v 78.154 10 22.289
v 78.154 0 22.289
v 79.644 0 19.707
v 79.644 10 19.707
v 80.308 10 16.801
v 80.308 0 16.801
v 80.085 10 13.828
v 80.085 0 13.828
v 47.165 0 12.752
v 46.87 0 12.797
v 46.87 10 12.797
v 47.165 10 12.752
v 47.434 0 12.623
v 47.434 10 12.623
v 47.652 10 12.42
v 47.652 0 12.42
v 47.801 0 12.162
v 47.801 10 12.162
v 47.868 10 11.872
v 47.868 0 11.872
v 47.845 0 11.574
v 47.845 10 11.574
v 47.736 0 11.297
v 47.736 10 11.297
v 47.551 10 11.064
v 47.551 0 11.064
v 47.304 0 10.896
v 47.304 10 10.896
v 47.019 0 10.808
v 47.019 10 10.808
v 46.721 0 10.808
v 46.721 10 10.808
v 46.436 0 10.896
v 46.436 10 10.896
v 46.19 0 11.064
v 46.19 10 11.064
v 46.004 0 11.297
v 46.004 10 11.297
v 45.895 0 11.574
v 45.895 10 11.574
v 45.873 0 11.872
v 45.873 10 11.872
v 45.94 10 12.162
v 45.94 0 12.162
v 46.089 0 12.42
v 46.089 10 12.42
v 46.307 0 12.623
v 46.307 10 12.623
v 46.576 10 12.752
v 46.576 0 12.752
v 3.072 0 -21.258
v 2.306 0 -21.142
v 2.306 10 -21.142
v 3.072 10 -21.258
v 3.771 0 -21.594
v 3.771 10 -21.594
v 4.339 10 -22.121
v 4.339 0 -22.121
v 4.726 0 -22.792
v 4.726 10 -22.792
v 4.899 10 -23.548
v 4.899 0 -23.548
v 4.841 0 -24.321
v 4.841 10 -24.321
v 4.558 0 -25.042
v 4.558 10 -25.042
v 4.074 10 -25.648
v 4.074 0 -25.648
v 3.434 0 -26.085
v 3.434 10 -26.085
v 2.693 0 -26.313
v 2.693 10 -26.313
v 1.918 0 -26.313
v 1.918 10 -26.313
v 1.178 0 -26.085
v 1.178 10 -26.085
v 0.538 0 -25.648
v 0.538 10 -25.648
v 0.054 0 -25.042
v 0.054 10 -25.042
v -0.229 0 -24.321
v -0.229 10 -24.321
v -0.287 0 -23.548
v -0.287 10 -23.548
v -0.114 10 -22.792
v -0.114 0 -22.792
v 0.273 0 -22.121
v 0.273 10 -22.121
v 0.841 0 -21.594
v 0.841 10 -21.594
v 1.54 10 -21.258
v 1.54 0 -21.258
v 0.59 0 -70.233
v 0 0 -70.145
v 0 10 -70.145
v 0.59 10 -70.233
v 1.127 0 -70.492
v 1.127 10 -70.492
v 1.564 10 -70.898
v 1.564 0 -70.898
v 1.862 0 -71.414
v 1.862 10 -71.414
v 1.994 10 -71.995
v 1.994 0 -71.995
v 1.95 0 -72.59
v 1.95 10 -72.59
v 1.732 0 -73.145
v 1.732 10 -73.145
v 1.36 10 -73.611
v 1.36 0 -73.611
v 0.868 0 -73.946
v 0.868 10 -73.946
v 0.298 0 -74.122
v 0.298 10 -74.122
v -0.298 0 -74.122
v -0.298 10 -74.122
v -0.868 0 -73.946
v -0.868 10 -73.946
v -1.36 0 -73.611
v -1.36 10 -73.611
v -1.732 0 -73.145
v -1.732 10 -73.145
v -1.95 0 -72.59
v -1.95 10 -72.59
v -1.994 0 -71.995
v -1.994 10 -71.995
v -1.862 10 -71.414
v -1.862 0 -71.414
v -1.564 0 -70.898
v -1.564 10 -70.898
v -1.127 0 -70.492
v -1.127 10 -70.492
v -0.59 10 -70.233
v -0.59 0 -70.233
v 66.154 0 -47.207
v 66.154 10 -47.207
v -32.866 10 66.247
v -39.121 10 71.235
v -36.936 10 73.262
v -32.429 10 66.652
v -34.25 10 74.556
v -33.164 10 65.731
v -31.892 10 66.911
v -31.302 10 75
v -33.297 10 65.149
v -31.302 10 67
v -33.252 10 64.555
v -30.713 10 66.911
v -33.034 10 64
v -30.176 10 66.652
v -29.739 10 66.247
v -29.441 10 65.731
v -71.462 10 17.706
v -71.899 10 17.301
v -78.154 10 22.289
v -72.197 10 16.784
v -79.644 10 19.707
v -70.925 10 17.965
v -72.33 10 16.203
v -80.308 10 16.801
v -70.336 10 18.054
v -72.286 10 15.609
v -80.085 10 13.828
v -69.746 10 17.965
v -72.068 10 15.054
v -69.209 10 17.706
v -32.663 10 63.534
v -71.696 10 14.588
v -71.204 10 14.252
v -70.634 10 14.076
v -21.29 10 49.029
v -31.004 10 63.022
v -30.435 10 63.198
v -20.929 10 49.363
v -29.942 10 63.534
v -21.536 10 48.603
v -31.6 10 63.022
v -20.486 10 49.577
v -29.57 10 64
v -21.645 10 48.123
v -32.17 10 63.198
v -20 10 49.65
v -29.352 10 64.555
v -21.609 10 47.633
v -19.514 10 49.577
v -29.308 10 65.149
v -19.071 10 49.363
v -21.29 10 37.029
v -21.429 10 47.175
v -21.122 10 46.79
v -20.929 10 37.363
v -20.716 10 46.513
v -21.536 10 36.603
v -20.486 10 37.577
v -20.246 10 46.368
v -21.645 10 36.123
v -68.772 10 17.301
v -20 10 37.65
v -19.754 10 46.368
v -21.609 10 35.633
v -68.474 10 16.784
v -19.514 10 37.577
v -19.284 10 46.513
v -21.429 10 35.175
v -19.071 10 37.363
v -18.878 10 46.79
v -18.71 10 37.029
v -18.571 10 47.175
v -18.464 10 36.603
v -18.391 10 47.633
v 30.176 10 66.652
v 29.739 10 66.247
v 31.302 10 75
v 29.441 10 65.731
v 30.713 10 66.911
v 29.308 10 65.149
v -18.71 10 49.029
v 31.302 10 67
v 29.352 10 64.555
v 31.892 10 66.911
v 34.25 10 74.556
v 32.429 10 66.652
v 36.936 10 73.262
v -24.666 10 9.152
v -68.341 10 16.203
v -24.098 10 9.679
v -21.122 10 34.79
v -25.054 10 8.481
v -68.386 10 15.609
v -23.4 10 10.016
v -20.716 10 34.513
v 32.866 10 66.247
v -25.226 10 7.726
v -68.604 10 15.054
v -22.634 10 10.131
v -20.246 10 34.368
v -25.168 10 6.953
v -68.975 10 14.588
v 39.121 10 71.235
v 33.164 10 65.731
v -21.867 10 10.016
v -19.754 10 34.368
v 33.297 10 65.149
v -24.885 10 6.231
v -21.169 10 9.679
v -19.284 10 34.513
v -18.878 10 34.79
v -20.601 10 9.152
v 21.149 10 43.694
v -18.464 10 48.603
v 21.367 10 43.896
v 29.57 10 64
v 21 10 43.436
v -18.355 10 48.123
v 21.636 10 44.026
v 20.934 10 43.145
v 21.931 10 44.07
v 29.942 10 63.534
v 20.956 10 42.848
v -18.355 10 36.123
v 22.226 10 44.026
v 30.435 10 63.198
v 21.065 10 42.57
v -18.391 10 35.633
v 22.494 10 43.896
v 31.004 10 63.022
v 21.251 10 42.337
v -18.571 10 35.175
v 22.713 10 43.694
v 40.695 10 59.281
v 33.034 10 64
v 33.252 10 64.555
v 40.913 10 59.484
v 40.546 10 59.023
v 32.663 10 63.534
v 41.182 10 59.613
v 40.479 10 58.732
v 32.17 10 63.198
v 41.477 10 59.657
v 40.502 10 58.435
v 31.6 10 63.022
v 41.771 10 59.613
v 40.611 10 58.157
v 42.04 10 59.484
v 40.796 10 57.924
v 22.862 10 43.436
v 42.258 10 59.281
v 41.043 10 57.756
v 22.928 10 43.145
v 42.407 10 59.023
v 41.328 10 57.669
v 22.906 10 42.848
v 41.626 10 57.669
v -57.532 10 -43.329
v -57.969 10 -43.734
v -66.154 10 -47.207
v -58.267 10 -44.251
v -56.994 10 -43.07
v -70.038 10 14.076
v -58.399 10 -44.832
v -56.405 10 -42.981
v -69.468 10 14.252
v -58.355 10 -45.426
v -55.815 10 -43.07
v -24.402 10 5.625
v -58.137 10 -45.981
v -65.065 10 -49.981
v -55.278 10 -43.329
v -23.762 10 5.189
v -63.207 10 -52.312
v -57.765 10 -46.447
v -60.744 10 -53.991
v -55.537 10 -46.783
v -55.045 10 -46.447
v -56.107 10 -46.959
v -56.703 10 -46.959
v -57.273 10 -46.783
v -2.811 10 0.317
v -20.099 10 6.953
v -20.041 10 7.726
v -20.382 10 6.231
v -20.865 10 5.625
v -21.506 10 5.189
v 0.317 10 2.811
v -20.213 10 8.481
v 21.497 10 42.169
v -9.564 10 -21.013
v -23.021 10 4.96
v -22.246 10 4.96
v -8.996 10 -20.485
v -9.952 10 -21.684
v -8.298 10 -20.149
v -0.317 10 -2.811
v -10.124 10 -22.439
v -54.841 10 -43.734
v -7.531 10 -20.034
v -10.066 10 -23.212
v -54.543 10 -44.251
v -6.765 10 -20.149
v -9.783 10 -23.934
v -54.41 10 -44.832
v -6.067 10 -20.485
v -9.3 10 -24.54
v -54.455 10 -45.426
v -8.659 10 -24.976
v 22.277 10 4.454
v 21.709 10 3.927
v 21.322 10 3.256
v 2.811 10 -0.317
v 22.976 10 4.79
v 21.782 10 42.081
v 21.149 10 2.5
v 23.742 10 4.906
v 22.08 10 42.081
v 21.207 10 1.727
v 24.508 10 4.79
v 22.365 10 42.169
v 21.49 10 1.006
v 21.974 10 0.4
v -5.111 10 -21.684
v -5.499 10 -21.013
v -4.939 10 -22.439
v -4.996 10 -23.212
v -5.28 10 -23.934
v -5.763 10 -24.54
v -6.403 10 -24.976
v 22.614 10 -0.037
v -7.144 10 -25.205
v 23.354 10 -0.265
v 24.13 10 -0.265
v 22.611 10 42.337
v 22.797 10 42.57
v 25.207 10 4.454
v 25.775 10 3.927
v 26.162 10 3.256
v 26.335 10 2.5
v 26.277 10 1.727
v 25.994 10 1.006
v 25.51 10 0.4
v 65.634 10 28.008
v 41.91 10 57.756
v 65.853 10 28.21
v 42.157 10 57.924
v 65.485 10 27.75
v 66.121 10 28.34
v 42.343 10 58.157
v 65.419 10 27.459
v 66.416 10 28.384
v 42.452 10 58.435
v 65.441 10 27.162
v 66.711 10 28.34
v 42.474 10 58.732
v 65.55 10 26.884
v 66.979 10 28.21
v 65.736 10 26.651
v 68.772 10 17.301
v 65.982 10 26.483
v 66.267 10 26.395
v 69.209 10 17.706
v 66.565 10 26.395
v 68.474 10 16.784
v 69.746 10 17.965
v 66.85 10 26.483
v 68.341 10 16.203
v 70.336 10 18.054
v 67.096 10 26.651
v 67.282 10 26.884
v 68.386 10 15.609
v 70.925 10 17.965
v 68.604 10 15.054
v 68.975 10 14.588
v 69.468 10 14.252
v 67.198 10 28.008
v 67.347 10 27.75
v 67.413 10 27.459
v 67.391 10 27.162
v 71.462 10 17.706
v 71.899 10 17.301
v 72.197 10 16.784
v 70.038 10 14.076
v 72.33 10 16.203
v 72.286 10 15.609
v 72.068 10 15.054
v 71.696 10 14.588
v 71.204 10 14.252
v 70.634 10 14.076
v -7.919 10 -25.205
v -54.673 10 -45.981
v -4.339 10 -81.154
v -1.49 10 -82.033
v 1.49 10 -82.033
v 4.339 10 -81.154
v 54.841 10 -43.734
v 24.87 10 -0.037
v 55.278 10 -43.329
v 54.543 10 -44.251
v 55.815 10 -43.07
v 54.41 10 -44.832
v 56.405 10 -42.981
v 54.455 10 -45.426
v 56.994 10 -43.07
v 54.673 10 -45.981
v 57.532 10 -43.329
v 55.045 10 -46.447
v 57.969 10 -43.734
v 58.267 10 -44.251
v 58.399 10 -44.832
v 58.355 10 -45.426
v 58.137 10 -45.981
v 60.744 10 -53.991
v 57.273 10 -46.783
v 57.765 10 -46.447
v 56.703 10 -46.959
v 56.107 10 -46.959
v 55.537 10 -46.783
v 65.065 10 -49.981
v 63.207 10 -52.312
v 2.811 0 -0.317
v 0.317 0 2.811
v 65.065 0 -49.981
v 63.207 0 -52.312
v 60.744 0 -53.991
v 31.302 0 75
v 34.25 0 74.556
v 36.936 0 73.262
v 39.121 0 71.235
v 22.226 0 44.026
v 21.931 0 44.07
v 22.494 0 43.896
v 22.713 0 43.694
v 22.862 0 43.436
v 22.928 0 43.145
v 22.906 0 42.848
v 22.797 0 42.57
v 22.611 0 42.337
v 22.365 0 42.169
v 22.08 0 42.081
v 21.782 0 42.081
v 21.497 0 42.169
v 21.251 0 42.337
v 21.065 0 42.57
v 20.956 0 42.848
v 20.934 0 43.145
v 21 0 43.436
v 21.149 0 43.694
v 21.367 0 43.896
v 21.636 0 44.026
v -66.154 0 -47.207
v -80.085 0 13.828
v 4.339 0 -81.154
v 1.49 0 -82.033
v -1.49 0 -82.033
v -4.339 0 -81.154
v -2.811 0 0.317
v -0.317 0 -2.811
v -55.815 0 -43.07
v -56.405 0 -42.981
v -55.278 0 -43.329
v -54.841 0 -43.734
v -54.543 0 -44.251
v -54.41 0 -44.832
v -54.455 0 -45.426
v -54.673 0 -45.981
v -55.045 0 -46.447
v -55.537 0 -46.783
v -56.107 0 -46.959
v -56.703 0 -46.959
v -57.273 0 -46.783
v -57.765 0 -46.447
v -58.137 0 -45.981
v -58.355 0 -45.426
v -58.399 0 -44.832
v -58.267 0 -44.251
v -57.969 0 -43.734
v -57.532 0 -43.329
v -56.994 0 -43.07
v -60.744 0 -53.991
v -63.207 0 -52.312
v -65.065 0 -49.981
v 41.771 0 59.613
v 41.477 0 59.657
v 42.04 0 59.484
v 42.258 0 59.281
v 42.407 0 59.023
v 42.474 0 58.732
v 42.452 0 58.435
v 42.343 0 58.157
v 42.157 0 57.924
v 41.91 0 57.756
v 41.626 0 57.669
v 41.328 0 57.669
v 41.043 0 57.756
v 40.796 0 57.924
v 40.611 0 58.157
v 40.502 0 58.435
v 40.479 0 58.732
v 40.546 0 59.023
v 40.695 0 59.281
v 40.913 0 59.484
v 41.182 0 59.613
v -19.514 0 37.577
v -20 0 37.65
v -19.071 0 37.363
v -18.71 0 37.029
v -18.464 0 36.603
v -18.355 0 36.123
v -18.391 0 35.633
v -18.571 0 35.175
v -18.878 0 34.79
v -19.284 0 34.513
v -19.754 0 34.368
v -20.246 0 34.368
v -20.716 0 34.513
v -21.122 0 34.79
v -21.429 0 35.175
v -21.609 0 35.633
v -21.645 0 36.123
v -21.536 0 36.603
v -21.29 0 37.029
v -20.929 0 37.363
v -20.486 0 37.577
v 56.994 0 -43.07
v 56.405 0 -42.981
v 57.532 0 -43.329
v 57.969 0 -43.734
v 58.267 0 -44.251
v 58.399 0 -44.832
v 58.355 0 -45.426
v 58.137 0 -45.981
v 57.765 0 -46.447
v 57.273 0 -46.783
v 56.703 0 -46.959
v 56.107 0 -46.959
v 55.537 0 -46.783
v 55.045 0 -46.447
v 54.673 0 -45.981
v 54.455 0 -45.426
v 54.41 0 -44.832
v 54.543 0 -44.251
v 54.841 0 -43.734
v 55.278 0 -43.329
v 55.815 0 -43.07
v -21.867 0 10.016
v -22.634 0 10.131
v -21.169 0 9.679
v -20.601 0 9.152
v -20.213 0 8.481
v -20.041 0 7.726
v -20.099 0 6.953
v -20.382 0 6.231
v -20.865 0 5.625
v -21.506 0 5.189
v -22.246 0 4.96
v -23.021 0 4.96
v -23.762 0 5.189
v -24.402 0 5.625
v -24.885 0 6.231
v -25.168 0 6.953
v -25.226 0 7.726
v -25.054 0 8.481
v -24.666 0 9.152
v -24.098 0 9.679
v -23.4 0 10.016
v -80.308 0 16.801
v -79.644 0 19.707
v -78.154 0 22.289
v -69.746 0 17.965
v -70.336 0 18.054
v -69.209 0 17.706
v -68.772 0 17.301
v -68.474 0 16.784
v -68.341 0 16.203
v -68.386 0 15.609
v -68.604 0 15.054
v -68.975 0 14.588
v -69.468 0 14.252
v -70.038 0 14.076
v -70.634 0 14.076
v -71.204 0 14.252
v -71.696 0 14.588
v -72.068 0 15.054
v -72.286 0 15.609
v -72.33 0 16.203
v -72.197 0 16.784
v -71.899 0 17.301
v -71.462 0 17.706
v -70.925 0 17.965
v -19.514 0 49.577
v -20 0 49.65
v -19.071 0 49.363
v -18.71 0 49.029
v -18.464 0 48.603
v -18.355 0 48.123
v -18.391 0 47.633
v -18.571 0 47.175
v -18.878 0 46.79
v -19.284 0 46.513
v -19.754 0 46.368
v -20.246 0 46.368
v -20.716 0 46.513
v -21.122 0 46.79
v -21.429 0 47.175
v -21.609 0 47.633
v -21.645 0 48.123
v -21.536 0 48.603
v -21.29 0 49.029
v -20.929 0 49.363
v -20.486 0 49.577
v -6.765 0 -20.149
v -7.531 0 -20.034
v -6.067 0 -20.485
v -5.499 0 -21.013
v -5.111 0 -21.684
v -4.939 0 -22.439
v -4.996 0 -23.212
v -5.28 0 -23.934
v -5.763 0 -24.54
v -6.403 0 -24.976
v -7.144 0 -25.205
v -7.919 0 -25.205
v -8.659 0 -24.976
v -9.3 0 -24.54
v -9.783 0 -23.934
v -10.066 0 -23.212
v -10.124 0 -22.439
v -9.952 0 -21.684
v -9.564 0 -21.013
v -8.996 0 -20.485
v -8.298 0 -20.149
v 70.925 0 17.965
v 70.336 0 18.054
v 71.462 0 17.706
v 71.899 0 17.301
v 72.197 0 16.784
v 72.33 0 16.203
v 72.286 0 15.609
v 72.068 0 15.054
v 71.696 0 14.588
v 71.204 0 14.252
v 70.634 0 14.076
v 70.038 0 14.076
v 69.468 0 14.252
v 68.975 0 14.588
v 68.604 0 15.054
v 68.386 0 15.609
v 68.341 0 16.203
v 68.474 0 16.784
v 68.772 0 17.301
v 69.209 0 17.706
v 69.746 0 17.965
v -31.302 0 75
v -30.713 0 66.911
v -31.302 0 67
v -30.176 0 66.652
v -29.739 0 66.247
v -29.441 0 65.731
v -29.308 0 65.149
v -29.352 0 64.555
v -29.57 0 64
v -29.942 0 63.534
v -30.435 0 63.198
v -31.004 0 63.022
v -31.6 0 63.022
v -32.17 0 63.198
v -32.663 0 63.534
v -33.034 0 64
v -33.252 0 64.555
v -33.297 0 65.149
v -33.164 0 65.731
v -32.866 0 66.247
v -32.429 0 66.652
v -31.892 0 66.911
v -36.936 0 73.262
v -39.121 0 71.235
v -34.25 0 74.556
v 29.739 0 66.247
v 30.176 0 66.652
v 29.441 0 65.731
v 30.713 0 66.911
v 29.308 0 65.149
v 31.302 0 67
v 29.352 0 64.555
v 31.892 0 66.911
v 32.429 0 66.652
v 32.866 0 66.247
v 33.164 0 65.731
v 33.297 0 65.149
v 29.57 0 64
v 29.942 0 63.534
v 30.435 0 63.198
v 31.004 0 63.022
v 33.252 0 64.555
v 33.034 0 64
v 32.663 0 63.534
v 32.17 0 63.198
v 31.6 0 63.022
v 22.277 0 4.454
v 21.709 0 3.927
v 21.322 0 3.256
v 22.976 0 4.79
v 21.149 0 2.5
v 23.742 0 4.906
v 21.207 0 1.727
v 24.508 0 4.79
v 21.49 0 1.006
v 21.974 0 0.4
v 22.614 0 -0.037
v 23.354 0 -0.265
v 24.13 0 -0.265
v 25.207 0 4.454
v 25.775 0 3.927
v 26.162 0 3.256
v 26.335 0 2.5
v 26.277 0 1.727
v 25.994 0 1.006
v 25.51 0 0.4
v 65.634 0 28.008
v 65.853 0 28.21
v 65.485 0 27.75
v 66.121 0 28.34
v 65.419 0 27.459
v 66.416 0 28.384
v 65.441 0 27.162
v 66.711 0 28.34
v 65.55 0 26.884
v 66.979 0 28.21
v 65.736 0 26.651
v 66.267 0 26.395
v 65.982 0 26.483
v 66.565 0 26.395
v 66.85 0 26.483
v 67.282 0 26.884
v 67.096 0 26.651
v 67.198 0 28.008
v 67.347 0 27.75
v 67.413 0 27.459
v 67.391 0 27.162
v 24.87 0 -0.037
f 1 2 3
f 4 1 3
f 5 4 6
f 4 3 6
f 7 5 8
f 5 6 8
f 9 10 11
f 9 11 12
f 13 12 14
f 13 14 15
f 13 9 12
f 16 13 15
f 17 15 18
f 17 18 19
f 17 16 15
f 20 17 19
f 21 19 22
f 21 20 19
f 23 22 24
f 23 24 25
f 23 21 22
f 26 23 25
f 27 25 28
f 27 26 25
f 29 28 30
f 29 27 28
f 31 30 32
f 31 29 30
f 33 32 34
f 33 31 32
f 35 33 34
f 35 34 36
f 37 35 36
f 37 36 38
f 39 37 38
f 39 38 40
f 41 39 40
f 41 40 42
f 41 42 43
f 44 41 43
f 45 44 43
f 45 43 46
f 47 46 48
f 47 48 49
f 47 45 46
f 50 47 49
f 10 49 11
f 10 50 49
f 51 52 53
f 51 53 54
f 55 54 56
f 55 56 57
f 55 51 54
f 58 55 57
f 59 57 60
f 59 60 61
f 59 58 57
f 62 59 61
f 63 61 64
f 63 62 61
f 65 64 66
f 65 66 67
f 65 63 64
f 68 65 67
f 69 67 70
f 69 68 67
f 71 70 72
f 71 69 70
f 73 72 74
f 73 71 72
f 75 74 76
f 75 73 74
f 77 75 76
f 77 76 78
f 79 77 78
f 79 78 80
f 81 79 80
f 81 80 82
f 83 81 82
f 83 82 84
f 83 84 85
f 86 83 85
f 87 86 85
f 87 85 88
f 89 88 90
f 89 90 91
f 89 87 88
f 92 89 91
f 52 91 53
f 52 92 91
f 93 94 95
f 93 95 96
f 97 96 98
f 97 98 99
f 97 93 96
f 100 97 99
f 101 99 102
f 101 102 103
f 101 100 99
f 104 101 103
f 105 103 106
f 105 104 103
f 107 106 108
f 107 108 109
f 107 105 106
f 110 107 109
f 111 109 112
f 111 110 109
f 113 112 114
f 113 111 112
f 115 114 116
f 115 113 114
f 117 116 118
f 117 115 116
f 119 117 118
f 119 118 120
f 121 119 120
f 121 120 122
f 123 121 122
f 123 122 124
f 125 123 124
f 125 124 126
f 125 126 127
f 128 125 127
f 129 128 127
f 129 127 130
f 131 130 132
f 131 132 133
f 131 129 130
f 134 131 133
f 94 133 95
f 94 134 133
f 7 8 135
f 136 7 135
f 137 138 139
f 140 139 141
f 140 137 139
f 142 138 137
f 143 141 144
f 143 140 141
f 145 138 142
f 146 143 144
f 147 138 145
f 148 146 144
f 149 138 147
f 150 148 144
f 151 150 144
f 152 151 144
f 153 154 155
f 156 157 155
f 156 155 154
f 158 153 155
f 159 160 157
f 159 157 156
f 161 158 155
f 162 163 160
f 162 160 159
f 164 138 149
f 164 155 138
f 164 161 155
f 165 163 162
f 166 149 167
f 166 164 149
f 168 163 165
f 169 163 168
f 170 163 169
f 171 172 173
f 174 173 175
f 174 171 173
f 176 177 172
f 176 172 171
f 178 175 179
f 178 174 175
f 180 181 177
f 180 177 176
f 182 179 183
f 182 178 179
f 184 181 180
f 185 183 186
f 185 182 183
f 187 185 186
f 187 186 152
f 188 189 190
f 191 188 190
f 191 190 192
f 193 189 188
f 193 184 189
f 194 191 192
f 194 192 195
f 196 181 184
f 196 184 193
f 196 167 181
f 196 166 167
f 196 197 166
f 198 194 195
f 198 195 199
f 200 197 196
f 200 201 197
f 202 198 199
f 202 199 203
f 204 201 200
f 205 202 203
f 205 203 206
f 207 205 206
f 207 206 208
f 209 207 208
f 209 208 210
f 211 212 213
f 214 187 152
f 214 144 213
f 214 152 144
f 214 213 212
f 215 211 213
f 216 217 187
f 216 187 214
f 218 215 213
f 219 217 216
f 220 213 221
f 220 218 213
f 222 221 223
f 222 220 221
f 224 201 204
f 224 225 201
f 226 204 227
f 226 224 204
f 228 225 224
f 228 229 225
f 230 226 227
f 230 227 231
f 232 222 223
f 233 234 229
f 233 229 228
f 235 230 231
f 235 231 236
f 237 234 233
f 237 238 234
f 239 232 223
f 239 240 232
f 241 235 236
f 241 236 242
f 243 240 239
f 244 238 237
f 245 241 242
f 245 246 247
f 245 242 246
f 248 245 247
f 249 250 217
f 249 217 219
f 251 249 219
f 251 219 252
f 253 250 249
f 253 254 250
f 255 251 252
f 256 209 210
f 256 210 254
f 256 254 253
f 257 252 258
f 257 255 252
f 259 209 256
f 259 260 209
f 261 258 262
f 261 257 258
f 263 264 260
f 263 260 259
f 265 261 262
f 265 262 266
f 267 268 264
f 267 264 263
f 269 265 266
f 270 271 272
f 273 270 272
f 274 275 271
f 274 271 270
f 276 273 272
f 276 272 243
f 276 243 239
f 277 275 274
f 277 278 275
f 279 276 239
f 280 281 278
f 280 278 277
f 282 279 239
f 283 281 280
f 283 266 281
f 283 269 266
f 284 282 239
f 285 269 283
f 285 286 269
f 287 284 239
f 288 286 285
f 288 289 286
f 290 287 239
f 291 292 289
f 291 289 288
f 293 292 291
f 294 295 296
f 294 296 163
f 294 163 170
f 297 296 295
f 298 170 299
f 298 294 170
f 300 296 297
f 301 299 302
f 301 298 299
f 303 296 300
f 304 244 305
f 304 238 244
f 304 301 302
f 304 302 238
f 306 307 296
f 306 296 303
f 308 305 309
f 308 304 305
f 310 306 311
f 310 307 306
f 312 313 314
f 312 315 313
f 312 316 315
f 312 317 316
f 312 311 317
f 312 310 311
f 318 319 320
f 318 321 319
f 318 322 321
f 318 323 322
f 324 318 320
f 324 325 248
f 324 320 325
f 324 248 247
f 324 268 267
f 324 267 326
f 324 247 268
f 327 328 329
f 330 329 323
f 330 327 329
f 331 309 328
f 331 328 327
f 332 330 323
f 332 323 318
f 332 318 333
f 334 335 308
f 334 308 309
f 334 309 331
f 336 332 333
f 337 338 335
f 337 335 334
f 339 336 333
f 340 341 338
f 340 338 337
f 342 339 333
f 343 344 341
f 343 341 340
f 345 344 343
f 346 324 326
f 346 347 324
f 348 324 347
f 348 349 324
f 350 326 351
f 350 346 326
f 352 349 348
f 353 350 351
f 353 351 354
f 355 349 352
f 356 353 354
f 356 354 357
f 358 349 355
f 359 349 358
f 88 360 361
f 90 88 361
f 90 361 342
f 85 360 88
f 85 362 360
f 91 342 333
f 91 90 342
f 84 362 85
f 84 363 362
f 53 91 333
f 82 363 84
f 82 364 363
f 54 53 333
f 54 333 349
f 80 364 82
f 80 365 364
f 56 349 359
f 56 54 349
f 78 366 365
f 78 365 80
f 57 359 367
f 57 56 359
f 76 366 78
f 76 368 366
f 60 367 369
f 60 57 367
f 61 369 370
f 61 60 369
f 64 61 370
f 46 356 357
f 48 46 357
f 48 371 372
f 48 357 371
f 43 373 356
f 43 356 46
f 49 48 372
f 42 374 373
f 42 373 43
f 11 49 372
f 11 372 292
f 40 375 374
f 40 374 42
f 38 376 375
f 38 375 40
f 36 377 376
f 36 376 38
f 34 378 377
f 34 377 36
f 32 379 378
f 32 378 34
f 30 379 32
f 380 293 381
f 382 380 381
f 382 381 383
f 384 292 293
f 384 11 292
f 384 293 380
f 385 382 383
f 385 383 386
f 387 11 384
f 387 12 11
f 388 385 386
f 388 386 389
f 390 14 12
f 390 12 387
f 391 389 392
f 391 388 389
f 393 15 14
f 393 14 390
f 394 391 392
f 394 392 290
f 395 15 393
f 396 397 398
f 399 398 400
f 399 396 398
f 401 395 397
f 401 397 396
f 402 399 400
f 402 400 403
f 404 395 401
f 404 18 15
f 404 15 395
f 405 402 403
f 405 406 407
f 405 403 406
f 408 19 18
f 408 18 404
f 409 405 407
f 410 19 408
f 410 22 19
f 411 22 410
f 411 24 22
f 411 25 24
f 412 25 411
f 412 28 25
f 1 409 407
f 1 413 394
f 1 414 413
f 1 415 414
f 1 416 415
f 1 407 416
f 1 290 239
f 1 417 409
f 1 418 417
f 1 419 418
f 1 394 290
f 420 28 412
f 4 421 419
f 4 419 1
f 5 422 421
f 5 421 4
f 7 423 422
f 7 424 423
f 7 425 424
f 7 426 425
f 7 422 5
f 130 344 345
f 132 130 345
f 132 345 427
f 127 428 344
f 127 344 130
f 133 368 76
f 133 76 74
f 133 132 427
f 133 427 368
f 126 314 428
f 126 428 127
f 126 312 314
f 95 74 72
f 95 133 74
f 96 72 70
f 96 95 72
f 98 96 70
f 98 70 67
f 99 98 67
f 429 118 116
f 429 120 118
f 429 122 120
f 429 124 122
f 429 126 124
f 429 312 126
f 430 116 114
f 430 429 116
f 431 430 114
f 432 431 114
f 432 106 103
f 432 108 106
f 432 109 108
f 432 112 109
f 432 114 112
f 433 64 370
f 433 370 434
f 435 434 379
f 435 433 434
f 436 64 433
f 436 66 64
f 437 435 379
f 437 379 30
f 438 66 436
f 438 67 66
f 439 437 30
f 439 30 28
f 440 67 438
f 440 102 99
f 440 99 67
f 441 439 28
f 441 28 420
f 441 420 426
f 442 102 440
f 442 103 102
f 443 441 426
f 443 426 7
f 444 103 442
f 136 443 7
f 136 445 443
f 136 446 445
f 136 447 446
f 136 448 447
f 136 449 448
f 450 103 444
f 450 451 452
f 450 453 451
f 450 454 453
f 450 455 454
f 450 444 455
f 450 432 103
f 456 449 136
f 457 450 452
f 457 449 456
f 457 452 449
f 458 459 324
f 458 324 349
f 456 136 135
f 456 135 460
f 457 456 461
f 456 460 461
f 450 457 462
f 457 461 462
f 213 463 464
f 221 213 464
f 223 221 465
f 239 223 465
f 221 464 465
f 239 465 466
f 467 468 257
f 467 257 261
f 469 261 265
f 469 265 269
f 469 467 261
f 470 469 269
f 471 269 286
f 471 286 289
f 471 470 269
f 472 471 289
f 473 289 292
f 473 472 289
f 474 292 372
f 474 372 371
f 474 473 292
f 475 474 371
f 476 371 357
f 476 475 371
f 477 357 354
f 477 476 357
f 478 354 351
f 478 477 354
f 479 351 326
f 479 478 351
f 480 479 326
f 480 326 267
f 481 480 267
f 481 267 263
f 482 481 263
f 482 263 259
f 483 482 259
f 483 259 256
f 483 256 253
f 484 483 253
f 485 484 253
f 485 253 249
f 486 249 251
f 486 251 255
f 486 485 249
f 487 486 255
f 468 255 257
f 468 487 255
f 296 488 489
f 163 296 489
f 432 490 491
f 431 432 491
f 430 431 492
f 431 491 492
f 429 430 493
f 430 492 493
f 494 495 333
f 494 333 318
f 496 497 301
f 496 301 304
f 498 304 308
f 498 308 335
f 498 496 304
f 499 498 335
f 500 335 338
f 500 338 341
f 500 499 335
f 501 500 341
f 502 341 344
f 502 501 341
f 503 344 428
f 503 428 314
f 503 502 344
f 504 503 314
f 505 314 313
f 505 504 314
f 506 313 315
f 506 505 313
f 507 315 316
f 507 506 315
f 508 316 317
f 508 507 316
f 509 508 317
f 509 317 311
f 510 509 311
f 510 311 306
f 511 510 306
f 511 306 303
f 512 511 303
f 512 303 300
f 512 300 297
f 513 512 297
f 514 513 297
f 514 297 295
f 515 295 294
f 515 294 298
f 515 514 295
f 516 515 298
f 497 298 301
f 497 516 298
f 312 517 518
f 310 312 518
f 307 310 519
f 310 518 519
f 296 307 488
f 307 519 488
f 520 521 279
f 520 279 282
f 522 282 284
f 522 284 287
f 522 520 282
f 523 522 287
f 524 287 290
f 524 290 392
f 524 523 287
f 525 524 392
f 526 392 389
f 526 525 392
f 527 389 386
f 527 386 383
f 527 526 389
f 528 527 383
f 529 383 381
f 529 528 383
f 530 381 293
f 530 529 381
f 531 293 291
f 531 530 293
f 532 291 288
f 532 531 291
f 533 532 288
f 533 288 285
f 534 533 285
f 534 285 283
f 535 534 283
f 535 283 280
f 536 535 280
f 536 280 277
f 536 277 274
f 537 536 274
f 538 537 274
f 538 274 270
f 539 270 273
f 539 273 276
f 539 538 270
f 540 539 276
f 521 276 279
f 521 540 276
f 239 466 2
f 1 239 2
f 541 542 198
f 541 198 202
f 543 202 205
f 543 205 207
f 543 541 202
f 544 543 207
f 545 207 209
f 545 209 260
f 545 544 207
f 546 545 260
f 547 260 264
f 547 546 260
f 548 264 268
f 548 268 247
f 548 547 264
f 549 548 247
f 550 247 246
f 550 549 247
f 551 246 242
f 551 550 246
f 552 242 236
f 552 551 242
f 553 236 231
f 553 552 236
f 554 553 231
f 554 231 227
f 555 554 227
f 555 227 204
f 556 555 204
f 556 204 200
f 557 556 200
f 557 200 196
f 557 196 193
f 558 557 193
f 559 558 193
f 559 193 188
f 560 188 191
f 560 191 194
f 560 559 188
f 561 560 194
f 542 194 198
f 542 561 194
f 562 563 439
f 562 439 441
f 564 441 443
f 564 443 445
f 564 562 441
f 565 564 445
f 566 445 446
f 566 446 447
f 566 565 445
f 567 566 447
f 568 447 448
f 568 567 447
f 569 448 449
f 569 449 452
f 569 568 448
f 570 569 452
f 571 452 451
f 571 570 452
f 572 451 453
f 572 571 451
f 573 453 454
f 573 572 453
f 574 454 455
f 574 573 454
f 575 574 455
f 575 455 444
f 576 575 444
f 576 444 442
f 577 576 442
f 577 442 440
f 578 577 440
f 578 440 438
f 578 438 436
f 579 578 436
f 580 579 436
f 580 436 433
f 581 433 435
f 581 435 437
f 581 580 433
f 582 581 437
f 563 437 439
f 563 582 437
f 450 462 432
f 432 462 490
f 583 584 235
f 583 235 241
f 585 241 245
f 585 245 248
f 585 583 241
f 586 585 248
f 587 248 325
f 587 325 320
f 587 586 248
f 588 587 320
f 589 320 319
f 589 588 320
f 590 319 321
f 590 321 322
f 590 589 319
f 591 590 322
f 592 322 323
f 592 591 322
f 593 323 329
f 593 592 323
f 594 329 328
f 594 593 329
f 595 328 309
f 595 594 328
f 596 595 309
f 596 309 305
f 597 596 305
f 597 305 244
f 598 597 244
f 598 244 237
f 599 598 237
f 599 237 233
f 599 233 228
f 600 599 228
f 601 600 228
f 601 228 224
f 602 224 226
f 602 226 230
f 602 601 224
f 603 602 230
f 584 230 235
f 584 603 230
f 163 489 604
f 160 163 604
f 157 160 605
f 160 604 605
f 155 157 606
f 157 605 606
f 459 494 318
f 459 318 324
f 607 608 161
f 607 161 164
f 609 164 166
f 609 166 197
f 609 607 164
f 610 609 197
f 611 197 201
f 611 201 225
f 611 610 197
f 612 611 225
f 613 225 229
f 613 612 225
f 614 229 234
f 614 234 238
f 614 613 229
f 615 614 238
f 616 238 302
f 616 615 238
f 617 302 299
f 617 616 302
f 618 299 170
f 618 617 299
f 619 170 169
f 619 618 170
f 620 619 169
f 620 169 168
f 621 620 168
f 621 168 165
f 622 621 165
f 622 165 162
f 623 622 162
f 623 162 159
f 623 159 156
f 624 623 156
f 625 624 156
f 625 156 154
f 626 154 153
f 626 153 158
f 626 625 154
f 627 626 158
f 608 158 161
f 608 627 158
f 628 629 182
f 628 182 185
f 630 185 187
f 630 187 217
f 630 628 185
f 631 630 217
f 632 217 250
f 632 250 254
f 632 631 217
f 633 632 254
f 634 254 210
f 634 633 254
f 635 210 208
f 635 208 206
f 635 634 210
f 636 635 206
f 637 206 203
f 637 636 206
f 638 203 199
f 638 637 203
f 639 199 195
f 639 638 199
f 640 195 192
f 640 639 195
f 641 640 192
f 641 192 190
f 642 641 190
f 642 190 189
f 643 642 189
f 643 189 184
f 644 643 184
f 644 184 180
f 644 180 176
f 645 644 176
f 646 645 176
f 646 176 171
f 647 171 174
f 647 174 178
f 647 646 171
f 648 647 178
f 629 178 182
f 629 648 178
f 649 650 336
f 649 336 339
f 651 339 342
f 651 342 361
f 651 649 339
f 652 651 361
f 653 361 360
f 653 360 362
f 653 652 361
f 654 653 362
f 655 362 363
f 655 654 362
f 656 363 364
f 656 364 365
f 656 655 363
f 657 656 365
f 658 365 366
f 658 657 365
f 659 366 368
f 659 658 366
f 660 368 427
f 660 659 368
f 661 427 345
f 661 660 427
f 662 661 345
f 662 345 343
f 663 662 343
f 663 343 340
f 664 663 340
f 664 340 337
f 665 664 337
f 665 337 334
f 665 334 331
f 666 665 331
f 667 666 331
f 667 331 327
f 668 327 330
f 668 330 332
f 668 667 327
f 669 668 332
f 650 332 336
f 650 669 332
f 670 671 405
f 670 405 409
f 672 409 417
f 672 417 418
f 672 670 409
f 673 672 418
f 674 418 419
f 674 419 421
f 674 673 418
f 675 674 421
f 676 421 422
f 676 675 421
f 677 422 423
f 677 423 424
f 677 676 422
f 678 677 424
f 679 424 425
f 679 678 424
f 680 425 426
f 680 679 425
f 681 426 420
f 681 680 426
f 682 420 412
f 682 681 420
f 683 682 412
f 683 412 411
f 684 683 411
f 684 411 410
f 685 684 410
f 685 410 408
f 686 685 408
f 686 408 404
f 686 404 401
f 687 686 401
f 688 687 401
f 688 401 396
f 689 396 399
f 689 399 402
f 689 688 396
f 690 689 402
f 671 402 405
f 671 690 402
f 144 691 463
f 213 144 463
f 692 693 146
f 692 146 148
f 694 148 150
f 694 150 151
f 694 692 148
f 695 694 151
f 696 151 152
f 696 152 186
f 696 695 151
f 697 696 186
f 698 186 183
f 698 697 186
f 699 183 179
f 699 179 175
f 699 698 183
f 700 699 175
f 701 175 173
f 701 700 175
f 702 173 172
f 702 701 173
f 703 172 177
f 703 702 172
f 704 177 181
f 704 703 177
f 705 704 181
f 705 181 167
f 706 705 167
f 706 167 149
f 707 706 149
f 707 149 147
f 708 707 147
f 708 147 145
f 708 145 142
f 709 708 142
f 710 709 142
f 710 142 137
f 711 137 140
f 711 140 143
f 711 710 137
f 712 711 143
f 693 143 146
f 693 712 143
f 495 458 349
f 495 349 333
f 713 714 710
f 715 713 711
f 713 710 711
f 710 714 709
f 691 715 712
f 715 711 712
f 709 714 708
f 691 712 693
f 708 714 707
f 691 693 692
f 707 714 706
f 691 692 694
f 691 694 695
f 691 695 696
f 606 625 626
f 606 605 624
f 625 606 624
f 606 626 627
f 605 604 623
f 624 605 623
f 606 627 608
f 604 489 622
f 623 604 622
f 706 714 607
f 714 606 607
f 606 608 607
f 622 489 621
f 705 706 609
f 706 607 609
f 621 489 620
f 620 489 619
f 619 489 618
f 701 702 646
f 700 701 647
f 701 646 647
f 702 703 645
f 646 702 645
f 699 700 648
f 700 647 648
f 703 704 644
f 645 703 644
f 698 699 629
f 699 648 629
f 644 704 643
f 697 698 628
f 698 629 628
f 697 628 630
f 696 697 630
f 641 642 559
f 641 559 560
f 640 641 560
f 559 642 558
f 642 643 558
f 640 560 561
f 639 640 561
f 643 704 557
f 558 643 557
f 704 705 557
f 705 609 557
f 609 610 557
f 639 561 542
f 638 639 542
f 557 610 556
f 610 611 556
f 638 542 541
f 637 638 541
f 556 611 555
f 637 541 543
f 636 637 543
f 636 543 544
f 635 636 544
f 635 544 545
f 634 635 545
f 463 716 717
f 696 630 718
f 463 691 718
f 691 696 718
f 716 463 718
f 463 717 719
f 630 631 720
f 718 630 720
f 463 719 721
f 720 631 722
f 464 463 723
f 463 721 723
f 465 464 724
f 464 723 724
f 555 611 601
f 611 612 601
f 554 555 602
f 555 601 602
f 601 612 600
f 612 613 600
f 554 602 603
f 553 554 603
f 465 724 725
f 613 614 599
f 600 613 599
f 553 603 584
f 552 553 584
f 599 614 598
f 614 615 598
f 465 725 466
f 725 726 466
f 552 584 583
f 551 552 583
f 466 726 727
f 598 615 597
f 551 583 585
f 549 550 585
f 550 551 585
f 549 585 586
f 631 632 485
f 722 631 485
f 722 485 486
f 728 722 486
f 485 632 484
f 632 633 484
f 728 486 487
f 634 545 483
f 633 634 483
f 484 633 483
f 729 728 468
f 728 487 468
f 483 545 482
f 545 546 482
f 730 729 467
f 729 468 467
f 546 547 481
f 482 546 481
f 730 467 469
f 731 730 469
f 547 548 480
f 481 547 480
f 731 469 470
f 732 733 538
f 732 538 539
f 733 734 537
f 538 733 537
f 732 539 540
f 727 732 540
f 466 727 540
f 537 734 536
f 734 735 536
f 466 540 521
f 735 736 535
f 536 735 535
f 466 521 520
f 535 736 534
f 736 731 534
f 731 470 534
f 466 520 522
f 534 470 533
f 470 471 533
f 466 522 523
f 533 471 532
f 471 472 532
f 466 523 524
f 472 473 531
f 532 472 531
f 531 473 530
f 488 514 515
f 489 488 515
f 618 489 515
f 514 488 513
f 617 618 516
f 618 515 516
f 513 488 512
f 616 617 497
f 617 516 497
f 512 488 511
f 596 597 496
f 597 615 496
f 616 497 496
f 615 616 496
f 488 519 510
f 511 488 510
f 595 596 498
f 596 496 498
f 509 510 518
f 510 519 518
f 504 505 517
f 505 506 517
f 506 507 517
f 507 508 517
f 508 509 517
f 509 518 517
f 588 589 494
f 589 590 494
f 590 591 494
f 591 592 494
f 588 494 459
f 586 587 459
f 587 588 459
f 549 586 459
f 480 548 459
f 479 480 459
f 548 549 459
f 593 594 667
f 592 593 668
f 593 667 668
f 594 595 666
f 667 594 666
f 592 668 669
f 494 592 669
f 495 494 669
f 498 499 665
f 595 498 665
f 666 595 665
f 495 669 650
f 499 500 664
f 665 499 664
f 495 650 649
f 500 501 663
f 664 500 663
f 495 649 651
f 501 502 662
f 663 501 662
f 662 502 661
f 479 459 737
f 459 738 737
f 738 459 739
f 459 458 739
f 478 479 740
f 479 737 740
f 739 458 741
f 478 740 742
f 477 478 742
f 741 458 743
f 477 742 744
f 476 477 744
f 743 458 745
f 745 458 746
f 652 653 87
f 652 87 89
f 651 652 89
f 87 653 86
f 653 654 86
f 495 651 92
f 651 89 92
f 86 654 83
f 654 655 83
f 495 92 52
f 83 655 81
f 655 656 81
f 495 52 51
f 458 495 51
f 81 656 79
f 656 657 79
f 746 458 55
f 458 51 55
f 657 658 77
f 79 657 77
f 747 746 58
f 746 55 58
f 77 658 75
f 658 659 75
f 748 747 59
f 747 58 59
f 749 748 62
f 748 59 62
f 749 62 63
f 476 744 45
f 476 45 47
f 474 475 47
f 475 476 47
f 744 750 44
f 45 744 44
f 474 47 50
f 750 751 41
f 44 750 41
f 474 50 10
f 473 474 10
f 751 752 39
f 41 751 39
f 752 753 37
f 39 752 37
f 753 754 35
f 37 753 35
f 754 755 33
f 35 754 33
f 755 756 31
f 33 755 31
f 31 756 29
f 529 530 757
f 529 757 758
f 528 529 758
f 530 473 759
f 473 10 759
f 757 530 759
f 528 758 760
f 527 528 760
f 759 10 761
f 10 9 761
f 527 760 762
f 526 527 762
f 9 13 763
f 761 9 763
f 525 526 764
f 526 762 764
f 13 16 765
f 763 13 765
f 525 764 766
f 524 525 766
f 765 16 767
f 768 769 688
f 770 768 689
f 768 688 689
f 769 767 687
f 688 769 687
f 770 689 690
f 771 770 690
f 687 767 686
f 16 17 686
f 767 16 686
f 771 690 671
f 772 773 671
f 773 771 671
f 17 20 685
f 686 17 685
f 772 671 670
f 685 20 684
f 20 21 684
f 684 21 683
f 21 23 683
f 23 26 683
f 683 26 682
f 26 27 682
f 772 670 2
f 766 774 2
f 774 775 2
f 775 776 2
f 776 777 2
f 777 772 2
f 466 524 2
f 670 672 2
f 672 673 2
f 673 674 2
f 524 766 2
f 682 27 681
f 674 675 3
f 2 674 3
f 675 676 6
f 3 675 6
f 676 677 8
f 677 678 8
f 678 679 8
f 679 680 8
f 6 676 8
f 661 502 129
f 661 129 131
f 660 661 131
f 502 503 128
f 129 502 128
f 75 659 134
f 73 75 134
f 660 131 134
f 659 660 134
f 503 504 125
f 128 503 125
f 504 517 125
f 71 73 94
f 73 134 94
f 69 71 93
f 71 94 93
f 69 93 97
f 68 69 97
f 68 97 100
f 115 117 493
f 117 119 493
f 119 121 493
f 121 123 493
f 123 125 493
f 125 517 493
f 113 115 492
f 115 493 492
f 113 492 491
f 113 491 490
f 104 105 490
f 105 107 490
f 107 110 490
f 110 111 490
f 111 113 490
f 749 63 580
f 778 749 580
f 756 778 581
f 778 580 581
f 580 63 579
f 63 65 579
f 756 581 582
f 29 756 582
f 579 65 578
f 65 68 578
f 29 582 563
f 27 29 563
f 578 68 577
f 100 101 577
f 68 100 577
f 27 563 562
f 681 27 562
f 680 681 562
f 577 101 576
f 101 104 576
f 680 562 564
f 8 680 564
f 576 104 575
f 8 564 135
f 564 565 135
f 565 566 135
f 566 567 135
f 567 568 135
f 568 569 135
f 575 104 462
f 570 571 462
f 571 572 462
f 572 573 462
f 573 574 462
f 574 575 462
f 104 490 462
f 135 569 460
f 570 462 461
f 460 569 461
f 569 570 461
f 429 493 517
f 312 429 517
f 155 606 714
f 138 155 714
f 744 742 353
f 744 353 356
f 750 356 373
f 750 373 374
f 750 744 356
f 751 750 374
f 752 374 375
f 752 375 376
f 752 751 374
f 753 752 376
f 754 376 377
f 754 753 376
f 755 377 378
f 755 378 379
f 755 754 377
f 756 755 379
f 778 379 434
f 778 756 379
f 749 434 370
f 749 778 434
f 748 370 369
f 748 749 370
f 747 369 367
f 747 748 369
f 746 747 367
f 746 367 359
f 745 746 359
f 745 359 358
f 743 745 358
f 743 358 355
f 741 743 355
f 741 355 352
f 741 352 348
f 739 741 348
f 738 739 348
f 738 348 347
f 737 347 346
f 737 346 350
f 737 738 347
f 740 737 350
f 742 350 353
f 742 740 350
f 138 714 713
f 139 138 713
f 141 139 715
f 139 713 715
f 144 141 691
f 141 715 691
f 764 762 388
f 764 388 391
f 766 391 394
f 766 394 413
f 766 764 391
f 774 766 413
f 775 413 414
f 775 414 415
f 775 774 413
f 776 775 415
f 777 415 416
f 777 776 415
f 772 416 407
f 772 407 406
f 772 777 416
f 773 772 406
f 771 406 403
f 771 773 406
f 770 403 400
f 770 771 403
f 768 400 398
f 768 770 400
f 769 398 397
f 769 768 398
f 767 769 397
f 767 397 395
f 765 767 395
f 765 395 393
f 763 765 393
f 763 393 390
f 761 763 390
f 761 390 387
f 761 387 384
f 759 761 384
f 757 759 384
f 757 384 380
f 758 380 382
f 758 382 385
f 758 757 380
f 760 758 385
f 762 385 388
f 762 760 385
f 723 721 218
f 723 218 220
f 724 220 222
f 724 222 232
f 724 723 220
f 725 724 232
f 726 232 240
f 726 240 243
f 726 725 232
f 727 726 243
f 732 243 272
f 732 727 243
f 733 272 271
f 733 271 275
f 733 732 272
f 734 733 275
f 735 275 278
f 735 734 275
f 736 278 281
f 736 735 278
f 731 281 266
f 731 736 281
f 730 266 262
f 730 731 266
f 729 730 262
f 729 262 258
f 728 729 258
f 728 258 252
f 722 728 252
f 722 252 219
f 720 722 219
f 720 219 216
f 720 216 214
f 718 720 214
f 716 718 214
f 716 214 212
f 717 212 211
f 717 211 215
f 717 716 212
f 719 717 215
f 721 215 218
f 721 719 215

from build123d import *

# Parameters (mm, degrees)
SKETCH1_R           = 2
SKETCH1_R_2         = 1.65
SKETCH1_R_3         = 2.6
SKETCH1_R_4         = 1
BOSS_EXTRUDE1_DEPTH = 10


with BuildPart() as part:
    # Sketch1 → Boss-Extrude1 (new body)
    with BuildSketch(Plane(origin=(0, 0, 0), x_dir=(1, 0, 0), z_dir=(0, 1, 0))):
        with BuildLine():
            Line((80.08502162, -13.828464902), (66.154165207, 47.206604996))
            ThreePointArc((66.154165207, 47.206604996), (64.22320091, 51.216293675), (60.743723476, 53.991084335))
            Line((60.743723476, 53.991084335), (4.338837391, 81.15424585))
            ThreePointArc((4.338837391, 81.15424585), (0, 82.144557171), (-4.338837391, 81.15424585))
            Line((-4.338837391, 81.15424585), (-60.743723476, 53.991084335))
            ThreePointArc((-60.743723476, 53.991084335), (-64.22320091, 51.216293675), (-66.154165207, 47.206604996))
            Line((-66.154165207, 47.206604996), (-80.08502162, -13.828464902))
            ThreePointArc((-80.08502162, -13.828464902), (-80.08502162, -18.278883581), (-78.154057323, -22.28857226))
            Line((-78.154057323, -22.28857226), (-39.120665047, -71.234898019))
            ThreePointArc((-39.120665047, -71.234898019), (-35.641187614, -74.009688679), (-31.302350222, -75))
            Line((-31.302350222, -75), (31.302350222, -75))
            ThreePointArc((31.302350222, -75), (35.641187614, -74.009688679), (39.120665047, -71.234898019))
            Line((39.120665047, -71.234898019), (78.154057323, -22.28857226))
            ThreePointArc((78.154057323, -22.28857226), (80.08502162, -18.278883581), (80.08502162, -13.828464902))
        make_face()
        with Locations(Location((-31.302350222, -65, 0), (0, 0, 270))):
            Circle(SKETCH1_R, mode=Mode.SUBTRACT)
        with Locations(Location((70.335742498, -16.053674242, 0), (0, 0, 270))):
            Circle(SKETCH1_R, mode=Mode.SUBTRACT)
        with Locations(Location((0, 72.144557171, 0), (0, 0, 270))):
            Circle(SKETCH1_R, mode=Mode.SUBTRACT)
        with Locations(Location((56.404886085, 44.981395656, 0), (0, 0, 270))):
            Circle(SKETCH1_R, mode=Mode.SUBTRACT)
        with Locations(Location((-56.404886085, 44.981395656, 0), (0, 0, 270))):
            Circle(SKETCH1_R, mode=Mode.SUBTRACT)
        with Locations(Location((-70.335742498, -16.053674242, 0), (0, 0, 270))):
            Circle(SKETCH1_R, mode=Mode.SUBTRACT)
        with Locations(Location((31.302350222, -65, 0), (0, 0, 270))):
            Circle(SKETCH1_R, mode=Mode.SUBTRACT)
        with Locations(Location((-20, -48, 0), (0, 0, 270))):
            Circle(SKETCH1_R_2, mode=Mode.SUBTRACT)
        with Locations(Location((-20, -36, 0), (0, 0, 270))):
            Circle(SKETCH1_R_2, mode=Mode.SUBTRACT)
        with Locations(Location((-22.633605309, -7.531262225, 0), (0, 0, 270))):
            Circle(SKETCH1_R_3, mode=Mode.SUBTRACT)
        with Locations(Location((2.305986765, 23.741997074, 0), (0, 0, 270))):
            Circle(SKETCH1_R_3, mode=Mode.SUBTRACT)
        with Locations(Location((-7.531262225, 22.633605309, 0), (0, 0, 270))):
            Circle(SKETCH1_R_3, mode=Mode.SUBTRACT)
        with Locations(Location((23.741997074, -2.305986765, 0), (0, 0, 270))):
            Circle(SKETCH1_R_3, mode=Mode.SUBTRACT)
        with Locations(Location((41.476576253, -58.657425978, 0), (0, 0, 270))):
            Circle(SKETCH1_R_4, mode=Mode.SUBTRACT)
        with Locations(Location((66.416168327, -27.384166679, 0), (0, 0, 270))):
            Circle(SKETCH1_R_4, mode=Mode.SUBTRACT)
        with Locations(Location((46.870381266, -11.796921632, 0), (0, 0, 270))):
            Circle(SKETCH1_R_4, mode=Mode.SUBTRACT)
        with Locations(Location((21.930789191, -43.070180931, 0), (0, 0, 270))):
            Circle(SKETCH1_R_4, mode=Mode.SUBTRACT)
        Polygon((0.316683361, -2.810642569), (2.810642569, 0.316683361), (-0.316683361, 2.810642569), (-2.810642569, -0.316683361), align=None, mode=Mode.SUBTRACT)
    extrude(amount=BOSS_EXTRUDE1_DEPTH)


solid = part.part
